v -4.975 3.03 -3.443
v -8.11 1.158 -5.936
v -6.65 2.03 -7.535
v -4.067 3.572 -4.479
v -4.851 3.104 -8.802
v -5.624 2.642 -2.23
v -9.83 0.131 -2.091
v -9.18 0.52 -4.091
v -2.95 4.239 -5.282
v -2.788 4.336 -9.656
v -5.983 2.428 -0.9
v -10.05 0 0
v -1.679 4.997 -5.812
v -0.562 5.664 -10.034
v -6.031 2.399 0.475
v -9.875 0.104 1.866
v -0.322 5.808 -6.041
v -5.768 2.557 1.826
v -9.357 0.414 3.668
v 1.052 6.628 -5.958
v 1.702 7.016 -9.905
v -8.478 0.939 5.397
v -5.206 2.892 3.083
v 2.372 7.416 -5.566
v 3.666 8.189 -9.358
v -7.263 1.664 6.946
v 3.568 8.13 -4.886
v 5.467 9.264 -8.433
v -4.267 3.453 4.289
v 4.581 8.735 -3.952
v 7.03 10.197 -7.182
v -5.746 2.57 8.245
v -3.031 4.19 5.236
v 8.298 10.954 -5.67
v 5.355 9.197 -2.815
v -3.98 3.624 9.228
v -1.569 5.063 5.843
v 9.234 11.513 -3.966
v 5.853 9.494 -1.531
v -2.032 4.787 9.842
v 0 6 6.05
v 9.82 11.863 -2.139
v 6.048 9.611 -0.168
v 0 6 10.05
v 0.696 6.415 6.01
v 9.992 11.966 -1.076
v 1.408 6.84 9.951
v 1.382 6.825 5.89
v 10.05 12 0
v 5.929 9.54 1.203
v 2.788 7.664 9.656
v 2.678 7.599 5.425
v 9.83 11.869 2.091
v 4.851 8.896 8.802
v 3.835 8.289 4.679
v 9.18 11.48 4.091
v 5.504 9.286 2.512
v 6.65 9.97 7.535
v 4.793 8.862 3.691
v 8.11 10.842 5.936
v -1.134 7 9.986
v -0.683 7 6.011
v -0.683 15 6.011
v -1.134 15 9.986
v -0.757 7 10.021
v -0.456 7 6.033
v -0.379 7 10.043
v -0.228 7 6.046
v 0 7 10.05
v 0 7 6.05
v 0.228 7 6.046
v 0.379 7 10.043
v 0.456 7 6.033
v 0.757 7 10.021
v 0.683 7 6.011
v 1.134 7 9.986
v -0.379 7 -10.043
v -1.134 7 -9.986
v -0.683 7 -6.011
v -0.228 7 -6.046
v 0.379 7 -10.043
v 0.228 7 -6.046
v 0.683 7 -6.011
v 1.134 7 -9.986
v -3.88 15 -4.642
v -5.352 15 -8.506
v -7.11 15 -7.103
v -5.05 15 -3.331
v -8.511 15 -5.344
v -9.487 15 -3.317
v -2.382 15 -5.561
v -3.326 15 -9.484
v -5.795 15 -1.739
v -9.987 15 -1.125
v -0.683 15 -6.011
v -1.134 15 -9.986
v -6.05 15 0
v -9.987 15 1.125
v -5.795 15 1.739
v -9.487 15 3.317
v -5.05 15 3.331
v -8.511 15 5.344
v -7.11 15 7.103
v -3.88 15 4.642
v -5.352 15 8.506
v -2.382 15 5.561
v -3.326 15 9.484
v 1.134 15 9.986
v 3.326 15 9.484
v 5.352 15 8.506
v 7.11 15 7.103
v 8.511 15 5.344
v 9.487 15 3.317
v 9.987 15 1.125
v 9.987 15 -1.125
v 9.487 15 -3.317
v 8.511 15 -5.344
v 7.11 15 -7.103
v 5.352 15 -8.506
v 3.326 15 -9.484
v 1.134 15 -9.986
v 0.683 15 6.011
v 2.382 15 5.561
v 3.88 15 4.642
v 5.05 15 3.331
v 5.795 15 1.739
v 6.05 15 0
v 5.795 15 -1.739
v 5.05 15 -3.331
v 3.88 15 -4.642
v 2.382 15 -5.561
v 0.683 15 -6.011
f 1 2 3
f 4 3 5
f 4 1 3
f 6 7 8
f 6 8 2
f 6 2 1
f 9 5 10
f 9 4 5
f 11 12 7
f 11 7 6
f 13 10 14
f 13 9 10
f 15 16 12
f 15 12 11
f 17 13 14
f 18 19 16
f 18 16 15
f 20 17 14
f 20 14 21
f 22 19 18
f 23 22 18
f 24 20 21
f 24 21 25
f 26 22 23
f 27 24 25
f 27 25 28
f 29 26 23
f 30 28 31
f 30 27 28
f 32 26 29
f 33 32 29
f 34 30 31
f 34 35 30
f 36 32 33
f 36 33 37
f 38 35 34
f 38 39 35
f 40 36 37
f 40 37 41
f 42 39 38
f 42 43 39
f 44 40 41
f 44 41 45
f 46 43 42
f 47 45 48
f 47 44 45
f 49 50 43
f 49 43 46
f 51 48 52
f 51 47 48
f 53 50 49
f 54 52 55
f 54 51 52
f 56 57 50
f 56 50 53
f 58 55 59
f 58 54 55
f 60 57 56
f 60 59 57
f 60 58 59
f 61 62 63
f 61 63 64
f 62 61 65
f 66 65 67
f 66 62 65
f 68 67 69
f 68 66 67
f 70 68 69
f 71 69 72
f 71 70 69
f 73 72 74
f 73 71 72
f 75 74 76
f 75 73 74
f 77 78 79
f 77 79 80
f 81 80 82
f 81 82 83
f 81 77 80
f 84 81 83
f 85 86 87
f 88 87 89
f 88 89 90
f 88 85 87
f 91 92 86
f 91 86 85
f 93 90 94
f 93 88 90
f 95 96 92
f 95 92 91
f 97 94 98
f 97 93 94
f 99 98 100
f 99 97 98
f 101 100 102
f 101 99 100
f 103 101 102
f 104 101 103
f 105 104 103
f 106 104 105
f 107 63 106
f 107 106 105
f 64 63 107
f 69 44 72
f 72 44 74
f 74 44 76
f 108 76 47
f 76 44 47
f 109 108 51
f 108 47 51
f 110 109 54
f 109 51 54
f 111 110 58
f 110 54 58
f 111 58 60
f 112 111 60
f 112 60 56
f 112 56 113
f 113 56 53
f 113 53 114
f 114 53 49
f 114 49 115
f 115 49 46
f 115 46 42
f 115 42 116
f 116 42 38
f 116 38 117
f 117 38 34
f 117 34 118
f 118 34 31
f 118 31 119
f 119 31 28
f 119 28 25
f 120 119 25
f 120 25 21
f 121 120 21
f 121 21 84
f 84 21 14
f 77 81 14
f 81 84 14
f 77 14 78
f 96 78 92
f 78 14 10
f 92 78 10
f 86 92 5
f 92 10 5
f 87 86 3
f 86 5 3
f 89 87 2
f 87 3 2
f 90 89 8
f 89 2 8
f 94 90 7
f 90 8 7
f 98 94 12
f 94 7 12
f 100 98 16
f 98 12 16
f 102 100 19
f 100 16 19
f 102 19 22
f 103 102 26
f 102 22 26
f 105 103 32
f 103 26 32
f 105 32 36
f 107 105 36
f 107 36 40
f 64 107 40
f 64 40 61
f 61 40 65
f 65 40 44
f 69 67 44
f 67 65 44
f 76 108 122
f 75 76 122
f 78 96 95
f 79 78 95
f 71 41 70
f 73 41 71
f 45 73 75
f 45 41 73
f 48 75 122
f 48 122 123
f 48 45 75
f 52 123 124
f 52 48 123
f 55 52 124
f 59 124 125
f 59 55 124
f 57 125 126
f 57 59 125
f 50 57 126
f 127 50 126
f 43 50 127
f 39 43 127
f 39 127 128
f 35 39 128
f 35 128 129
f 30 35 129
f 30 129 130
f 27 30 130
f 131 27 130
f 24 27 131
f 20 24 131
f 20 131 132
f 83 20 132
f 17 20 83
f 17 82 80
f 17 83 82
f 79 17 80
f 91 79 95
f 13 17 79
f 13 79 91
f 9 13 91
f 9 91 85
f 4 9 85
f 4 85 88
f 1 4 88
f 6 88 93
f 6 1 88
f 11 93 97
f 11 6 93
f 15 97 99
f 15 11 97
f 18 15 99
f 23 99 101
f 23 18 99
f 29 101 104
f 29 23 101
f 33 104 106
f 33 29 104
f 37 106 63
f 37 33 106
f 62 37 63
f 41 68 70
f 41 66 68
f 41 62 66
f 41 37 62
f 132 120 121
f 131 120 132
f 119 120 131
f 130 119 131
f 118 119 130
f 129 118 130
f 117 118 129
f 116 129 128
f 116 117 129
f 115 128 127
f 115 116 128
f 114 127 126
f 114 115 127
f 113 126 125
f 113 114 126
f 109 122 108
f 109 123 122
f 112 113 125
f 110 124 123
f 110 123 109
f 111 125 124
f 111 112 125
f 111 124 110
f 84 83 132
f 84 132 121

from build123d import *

# Parameters (mm, degrees)
SKETCH1_R           = 10.05
SKETCH1_R_2         = 6.05
BOSS_EXTRUDE1_DEPTH = 15
CUT_EXTRUDE2_DEPTH  = 8
CUT_EXTRUDE3_DEPTH  = 15


with BuildPart() as part:
    # Sketch1 → Boss-Extrude1 (new body)
    with BuildSketch(Plane(origin=(0, 0, 0), x_dir=(1, 0, 0), z_dir=(0, 1, 0))):
        with Locations(Location((0, 0, 0), (0, 0, 270))):
            Circle(SKETCH1_R)
        with Locations(Location((0, 0, 0), (0, 0, 270))):
            Circle(SKETCH1_R_2, mode=Mode.SUBTRACT)
    extrude(amount=BOSS_EXTRUDE1_DEPTH)

    # Sketch6 → Cut-Extrude2 (cut)
    with BuildSketch(Plane(origin=(0, 15, 0), x_dir=(1, 0, 0), z_dir=(0, 1, 0))):
        Polygon((-0.637272671, 5.61077026), (0.637272671, 5.61077026), (1.215708589, 10.703521268), (-1.215708589, 10.703521268), align=None)
        Polygon((-0.637272671, -5.61077026), (-1.215708589, -10.703521268), (1.215708589, -10.703521268), (0.637272671, -5.61077026), align=None)
    extrude(amount=-CUT_EXTRUDE2_DEPTH, mode=Mode.SUBTRACT)

    # Sketch3 → Cut-Extrude3 (cut, symmetric)
    with BuildSketch(Plane.XY):
        Polygon((-10.05, 0), (10.05, 12), (10.05, 0), align=None)
    extrude(amount=CUT_EXTRUDE3_DEPTH, both=True, mode=Mode.SUBTRACT)


solid = part.part
